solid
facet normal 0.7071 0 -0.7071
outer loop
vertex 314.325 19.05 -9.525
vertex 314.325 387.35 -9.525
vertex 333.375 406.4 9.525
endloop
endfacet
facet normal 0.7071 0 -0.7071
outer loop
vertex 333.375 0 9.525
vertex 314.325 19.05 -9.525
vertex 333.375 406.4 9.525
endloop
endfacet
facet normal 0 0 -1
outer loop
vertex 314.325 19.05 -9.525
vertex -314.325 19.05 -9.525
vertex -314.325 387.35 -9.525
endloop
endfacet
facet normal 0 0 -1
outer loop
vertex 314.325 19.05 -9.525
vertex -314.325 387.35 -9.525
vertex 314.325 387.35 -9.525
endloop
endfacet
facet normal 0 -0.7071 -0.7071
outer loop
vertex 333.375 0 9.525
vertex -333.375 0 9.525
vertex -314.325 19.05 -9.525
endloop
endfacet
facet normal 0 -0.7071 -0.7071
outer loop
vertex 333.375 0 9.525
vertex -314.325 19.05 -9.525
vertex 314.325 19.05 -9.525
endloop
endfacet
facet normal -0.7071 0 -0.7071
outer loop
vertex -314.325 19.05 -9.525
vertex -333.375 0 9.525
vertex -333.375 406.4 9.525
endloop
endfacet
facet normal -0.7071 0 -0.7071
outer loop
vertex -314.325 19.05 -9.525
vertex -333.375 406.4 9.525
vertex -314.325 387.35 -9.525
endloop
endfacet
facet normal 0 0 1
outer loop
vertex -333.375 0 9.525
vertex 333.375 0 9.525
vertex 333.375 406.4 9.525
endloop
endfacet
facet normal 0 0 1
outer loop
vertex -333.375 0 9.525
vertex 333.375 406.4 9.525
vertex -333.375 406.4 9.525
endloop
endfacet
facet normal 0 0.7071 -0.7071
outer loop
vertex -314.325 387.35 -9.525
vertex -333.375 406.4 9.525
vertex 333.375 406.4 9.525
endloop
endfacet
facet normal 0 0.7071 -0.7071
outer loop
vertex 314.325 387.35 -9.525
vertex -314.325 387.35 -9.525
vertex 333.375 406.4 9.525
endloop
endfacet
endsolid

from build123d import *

# Parameters (mm, degrees)
F1_DEPTH = 406.4
F2_SIZE  = 19.04999
F3_SIZE  = 19.04999


# Not quite as in the source:
# - a fillet or chamfer is up to 0.001 mm smaller than in the source, because OpenCascade refuses the exact size


with BuildPart() as f1:
    # F0 (on Front) → F1 (new body)
    with BuildSketch(Plane.XZ):
        Polygon((333.375, 9.525), (-333.375, 9.525), (-314.325, -9.525), (314.325, -9.525), align=None)
    extrude(amount=-F1_DEPTH)

    # F2 (size 19.05 in the source; OpenCascade refuses exactly that, so slightly less here)
    f2_edges = [f1.edges().sort_by_distance(p)[0] for p in [
        (0, 406.4, -9.525),
    ]]
    chamfer(f2_edges, length=F2_SIZE)

    # F3 (size 19.05 in the source; OpenCascade refuses exactly that, so slightly less here)
    f3_edges = [f1.edges().sort_by_distance(p)[0] for p in [
        (0, 0, -9.525),
    ]]
    chamfer(f3_edges, length=F3_SIZE)


solid = f1.part
